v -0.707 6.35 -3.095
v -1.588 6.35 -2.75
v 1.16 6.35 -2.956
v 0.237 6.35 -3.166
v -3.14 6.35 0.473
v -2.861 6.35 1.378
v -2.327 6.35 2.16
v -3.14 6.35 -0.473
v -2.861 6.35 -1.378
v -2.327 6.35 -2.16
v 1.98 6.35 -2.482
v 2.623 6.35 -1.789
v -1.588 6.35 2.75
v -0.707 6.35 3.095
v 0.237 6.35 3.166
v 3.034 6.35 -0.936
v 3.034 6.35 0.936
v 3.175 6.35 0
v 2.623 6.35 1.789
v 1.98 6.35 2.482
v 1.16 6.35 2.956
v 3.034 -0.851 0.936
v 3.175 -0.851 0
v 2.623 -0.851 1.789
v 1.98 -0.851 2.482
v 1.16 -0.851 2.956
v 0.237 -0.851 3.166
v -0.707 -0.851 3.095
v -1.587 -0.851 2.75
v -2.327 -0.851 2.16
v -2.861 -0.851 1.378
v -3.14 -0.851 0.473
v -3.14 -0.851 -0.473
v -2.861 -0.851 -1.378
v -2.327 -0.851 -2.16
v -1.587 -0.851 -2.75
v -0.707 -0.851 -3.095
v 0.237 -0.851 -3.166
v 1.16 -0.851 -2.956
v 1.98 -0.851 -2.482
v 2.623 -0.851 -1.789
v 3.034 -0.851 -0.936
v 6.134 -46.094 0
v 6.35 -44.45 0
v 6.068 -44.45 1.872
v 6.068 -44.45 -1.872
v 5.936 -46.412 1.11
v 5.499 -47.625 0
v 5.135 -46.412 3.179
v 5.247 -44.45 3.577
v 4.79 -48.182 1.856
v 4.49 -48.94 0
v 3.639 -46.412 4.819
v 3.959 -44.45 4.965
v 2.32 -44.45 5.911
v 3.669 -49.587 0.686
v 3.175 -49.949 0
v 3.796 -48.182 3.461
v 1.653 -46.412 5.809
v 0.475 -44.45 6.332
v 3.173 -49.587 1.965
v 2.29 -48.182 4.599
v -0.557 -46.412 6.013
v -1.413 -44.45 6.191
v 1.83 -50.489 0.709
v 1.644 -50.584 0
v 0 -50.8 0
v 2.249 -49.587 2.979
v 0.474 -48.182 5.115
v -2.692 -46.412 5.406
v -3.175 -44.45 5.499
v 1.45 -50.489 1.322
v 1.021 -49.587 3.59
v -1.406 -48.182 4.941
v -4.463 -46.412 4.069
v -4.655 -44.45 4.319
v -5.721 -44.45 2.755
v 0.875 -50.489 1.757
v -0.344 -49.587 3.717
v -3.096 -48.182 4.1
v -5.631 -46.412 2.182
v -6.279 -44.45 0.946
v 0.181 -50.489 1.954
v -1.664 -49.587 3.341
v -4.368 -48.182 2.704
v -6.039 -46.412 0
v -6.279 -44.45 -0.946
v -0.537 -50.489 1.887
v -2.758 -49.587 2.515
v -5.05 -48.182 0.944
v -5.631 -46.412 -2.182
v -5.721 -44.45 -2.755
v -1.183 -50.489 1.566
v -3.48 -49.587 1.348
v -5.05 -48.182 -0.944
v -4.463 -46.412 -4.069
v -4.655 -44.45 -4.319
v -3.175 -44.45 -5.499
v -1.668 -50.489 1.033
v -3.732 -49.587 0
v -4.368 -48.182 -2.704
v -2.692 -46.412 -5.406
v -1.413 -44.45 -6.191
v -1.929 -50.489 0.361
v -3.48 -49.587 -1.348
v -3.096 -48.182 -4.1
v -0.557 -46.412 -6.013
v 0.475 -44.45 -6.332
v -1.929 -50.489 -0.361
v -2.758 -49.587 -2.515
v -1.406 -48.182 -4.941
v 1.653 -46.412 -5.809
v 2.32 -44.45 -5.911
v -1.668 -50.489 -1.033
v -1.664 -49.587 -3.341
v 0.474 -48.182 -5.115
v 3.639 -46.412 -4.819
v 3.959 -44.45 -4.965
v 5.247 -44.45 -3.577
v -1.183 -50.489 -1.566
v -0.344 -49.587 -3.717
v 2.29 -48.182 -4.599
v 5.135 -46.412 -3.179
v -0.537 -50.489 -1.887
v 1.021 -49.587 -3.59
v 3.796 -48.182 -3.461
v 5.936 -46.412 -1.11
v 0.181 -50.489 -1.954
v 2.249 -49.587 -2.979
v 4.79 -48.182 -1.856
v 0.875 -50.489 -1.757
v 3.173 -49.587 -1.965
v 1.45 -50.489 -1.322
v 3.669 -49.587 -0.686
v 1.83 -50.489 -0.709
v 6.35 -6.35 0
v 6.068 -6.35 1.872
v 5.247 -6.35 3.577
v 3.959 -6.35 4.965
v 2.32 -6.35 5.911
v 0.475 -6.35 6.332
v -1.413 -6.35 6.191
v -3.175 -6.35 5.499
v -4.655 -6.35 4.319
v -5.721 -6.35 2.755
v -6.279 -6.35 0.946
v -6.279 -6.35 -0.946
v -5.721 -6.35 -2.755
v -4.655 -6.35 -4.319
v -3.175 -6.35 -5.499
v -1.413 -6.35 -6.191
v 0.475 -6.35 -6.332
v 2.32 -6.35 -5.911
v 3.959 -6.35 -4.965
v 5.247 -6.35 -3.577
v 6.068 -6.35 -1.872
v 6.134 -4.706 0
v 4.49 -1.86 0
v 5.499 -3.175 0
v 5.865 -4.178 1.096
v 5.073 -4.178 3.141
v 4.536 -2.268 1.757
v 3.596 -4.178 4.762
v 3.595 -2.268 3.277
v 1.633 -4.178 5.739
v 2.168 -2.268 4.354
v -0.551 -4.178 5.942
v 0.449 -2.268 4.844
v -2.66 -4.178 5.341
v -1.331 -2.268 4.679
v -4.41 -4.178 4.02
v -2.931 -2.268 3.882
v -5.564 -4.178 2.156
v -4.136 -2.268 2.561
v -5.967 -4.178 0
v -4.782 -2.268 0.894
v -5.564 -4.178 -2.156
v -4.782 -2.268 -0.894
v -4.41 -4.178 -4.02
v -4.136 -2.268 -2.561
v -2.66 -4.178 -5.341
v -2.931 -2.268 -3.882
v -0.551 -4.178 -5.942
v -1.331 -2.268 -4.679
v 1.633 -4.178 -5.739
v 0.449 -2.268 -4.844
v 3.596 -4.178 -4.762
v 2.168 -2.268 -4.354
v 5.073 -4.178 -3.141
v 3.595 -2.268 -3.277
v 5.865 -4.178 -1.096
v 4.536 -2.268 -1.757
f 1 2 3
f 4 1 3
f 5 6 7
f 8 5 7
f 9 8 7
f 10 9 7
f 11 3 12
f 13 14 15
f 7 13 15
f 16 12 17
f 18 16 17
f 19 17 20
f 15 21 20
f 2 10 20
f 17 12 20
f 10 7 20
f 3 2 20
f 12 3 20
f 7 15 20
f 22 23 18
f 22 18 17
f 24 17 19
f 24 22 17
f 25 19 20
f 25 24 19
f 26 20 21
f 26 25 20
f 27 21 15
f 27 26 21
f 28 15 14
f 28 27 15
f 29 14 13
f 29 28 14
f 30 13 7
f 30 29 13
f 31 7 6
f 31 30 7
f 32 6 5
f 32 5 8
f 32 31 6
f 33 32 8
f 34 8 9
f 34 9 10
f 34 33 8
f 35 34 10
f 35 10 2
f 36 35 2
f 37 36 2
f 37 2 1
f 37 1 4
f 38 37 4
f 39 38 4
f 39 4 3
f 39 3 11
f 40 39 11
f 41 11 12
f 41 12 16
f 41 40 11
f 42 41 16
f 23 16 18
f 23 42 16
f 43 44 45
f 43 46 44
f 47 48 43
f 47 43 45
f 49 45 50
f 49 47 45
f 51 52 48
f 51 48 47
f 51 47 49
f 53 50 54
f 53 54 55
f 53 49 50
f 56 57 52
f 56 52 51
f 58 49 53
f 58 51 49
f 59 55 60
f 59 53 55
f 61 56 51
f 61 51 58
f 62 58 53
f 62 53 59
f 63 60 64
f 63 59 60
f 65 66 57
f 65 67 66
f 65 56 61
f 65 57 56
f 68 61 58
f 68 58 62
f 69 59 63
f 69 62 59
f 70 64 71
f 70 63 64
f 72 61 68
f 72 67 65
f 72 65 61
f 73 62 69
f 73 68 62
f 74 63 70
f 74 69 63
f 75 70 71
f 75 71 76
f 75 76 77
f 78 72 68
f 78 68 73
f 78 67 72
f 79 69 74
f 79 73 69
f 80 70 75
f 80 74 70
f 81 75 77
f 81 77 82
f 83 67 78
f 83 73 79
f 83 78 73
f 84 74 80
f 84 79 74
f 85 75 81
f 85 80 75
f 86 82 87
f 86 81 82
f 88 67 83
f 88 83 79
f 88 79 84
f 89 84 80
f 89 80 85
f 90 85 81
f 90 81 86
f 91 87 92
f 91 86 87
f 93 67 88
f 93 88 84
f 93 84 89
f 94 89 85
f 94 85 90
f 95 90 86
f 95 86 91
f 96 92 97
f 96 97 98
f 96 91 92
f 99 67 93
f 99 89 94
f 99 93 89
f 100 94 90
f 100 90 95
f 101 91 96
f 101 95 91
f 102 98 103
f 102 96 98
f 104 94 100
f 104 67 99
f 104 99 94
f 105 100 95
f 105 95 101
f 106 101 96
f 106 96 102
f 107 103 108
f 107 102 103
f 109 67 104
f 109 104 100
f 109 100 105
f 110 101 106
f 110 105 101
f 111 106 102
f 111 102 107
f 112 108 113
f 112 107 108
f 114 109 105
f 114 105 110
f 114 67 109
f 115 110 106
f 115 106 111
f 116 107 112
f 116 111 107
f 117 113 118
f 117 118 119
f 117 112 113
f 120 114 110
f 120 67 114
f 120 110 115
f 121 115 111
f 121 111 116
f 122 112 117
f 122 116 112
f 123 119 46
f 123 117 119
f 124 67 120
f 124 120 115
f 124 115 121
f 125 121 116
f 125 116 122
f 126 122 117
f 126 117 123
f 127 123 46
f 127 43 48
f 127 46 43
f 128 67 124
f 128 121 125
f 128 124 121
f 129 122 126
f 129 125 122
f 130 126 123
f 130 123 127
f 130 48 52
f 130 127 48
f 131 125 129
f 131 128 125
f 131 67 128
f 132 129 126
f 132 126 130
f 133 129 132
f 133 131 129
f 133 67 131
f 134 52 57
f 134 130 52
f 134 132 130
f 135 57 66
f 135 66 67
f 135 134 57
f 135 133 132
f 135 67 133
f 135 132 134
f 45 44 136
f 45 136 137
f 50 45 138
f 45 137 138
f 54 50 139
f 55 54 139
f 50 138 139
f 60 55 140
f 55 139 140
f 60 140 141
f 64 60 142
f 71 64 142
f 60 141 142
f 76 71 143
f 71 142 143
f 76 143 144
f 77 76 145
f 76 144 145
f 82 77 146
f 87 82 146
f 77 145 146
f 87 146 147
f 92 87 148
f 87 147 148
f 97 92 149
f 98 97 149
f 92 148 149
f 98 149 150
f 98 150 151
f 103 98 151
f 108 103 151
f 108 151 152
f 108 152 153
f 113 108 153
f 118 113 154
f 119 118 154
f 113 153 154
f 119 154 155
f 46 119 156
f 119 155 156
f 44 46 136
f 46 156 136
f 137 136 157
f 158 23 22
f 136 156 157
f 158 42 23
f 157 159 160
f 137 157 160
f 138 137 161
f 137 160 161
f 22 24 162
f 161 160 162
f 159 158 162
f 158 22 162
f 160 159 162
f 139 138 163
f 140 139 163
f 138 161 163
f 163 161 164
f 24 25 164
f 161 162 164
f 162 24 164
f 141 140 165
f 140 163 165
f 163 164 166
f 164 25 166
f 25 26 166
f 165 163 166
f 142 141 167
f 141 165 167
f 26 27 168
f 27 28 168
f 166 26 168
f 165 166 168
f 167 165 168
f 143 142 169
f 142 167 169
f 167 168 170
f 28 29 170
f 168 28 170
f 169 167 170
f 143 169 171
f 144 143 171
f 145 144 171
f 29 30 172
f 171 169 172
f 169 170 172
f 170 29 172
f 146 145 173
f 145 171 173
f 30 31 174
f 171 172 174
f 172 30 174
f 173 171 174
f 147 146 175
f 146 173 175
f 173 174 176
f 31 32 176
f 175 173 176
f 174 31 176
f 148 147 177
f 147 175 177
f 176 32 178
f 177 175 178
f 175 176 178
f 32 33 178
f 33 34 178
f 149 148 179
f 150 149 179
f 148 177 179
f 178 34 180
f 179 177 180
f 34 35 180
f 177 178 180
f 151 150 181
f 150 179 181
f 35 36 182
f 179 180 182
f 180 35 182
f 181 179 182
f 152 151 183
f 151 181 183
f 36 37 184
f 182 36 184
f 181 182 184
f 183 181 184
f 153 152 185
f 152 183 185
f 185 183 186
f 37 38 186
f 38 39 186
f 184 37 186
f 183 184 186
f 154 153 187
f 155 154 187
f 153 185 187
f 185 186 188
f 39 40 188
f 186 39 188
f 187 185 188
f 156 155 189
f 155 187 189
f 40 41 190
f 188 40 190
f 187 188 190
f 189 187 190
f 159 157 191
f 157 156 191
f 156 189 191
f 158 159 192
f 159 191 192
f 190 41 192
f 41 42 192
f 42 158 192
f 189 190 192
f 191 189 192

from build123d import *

# Parameters (mm, degrees)
F0_R     = 6.35
F1_DEPTH = 50.8
F2_R     = 6.35
F3_R     = 6.35
F4_R     = 3.175
F5_DEPTH = 6.35


with BuildPart() as f1:
    # F0 (on Front) → F1 (new body)
    with BuildSketch(Plane.XZ):
        Circle(F0_R)
    extrude(amount=F1_DEPTH)

    # F2
    f2_edges = [f1.edges().sort_by_distance(p)[0] for p in [
        (-6.35, -50.8, 0),
    ]]
    fillet(f2_edges, radius=F2_R)

    # F3
    f3_edges = [f1.edges().sort_by_distance(p)[0] for p in [
        (-6.35, 0, 0),
    ]]
    fillet(f3_edges, radius=F3_R)

    # F4 (on Front) → F5 (join, symmetric)
    with BuildSketch(Plane.XZ):
        Circle(F4_R)
    extrude(amount=F5_DEPTH, both=True)


solid = f1.part
